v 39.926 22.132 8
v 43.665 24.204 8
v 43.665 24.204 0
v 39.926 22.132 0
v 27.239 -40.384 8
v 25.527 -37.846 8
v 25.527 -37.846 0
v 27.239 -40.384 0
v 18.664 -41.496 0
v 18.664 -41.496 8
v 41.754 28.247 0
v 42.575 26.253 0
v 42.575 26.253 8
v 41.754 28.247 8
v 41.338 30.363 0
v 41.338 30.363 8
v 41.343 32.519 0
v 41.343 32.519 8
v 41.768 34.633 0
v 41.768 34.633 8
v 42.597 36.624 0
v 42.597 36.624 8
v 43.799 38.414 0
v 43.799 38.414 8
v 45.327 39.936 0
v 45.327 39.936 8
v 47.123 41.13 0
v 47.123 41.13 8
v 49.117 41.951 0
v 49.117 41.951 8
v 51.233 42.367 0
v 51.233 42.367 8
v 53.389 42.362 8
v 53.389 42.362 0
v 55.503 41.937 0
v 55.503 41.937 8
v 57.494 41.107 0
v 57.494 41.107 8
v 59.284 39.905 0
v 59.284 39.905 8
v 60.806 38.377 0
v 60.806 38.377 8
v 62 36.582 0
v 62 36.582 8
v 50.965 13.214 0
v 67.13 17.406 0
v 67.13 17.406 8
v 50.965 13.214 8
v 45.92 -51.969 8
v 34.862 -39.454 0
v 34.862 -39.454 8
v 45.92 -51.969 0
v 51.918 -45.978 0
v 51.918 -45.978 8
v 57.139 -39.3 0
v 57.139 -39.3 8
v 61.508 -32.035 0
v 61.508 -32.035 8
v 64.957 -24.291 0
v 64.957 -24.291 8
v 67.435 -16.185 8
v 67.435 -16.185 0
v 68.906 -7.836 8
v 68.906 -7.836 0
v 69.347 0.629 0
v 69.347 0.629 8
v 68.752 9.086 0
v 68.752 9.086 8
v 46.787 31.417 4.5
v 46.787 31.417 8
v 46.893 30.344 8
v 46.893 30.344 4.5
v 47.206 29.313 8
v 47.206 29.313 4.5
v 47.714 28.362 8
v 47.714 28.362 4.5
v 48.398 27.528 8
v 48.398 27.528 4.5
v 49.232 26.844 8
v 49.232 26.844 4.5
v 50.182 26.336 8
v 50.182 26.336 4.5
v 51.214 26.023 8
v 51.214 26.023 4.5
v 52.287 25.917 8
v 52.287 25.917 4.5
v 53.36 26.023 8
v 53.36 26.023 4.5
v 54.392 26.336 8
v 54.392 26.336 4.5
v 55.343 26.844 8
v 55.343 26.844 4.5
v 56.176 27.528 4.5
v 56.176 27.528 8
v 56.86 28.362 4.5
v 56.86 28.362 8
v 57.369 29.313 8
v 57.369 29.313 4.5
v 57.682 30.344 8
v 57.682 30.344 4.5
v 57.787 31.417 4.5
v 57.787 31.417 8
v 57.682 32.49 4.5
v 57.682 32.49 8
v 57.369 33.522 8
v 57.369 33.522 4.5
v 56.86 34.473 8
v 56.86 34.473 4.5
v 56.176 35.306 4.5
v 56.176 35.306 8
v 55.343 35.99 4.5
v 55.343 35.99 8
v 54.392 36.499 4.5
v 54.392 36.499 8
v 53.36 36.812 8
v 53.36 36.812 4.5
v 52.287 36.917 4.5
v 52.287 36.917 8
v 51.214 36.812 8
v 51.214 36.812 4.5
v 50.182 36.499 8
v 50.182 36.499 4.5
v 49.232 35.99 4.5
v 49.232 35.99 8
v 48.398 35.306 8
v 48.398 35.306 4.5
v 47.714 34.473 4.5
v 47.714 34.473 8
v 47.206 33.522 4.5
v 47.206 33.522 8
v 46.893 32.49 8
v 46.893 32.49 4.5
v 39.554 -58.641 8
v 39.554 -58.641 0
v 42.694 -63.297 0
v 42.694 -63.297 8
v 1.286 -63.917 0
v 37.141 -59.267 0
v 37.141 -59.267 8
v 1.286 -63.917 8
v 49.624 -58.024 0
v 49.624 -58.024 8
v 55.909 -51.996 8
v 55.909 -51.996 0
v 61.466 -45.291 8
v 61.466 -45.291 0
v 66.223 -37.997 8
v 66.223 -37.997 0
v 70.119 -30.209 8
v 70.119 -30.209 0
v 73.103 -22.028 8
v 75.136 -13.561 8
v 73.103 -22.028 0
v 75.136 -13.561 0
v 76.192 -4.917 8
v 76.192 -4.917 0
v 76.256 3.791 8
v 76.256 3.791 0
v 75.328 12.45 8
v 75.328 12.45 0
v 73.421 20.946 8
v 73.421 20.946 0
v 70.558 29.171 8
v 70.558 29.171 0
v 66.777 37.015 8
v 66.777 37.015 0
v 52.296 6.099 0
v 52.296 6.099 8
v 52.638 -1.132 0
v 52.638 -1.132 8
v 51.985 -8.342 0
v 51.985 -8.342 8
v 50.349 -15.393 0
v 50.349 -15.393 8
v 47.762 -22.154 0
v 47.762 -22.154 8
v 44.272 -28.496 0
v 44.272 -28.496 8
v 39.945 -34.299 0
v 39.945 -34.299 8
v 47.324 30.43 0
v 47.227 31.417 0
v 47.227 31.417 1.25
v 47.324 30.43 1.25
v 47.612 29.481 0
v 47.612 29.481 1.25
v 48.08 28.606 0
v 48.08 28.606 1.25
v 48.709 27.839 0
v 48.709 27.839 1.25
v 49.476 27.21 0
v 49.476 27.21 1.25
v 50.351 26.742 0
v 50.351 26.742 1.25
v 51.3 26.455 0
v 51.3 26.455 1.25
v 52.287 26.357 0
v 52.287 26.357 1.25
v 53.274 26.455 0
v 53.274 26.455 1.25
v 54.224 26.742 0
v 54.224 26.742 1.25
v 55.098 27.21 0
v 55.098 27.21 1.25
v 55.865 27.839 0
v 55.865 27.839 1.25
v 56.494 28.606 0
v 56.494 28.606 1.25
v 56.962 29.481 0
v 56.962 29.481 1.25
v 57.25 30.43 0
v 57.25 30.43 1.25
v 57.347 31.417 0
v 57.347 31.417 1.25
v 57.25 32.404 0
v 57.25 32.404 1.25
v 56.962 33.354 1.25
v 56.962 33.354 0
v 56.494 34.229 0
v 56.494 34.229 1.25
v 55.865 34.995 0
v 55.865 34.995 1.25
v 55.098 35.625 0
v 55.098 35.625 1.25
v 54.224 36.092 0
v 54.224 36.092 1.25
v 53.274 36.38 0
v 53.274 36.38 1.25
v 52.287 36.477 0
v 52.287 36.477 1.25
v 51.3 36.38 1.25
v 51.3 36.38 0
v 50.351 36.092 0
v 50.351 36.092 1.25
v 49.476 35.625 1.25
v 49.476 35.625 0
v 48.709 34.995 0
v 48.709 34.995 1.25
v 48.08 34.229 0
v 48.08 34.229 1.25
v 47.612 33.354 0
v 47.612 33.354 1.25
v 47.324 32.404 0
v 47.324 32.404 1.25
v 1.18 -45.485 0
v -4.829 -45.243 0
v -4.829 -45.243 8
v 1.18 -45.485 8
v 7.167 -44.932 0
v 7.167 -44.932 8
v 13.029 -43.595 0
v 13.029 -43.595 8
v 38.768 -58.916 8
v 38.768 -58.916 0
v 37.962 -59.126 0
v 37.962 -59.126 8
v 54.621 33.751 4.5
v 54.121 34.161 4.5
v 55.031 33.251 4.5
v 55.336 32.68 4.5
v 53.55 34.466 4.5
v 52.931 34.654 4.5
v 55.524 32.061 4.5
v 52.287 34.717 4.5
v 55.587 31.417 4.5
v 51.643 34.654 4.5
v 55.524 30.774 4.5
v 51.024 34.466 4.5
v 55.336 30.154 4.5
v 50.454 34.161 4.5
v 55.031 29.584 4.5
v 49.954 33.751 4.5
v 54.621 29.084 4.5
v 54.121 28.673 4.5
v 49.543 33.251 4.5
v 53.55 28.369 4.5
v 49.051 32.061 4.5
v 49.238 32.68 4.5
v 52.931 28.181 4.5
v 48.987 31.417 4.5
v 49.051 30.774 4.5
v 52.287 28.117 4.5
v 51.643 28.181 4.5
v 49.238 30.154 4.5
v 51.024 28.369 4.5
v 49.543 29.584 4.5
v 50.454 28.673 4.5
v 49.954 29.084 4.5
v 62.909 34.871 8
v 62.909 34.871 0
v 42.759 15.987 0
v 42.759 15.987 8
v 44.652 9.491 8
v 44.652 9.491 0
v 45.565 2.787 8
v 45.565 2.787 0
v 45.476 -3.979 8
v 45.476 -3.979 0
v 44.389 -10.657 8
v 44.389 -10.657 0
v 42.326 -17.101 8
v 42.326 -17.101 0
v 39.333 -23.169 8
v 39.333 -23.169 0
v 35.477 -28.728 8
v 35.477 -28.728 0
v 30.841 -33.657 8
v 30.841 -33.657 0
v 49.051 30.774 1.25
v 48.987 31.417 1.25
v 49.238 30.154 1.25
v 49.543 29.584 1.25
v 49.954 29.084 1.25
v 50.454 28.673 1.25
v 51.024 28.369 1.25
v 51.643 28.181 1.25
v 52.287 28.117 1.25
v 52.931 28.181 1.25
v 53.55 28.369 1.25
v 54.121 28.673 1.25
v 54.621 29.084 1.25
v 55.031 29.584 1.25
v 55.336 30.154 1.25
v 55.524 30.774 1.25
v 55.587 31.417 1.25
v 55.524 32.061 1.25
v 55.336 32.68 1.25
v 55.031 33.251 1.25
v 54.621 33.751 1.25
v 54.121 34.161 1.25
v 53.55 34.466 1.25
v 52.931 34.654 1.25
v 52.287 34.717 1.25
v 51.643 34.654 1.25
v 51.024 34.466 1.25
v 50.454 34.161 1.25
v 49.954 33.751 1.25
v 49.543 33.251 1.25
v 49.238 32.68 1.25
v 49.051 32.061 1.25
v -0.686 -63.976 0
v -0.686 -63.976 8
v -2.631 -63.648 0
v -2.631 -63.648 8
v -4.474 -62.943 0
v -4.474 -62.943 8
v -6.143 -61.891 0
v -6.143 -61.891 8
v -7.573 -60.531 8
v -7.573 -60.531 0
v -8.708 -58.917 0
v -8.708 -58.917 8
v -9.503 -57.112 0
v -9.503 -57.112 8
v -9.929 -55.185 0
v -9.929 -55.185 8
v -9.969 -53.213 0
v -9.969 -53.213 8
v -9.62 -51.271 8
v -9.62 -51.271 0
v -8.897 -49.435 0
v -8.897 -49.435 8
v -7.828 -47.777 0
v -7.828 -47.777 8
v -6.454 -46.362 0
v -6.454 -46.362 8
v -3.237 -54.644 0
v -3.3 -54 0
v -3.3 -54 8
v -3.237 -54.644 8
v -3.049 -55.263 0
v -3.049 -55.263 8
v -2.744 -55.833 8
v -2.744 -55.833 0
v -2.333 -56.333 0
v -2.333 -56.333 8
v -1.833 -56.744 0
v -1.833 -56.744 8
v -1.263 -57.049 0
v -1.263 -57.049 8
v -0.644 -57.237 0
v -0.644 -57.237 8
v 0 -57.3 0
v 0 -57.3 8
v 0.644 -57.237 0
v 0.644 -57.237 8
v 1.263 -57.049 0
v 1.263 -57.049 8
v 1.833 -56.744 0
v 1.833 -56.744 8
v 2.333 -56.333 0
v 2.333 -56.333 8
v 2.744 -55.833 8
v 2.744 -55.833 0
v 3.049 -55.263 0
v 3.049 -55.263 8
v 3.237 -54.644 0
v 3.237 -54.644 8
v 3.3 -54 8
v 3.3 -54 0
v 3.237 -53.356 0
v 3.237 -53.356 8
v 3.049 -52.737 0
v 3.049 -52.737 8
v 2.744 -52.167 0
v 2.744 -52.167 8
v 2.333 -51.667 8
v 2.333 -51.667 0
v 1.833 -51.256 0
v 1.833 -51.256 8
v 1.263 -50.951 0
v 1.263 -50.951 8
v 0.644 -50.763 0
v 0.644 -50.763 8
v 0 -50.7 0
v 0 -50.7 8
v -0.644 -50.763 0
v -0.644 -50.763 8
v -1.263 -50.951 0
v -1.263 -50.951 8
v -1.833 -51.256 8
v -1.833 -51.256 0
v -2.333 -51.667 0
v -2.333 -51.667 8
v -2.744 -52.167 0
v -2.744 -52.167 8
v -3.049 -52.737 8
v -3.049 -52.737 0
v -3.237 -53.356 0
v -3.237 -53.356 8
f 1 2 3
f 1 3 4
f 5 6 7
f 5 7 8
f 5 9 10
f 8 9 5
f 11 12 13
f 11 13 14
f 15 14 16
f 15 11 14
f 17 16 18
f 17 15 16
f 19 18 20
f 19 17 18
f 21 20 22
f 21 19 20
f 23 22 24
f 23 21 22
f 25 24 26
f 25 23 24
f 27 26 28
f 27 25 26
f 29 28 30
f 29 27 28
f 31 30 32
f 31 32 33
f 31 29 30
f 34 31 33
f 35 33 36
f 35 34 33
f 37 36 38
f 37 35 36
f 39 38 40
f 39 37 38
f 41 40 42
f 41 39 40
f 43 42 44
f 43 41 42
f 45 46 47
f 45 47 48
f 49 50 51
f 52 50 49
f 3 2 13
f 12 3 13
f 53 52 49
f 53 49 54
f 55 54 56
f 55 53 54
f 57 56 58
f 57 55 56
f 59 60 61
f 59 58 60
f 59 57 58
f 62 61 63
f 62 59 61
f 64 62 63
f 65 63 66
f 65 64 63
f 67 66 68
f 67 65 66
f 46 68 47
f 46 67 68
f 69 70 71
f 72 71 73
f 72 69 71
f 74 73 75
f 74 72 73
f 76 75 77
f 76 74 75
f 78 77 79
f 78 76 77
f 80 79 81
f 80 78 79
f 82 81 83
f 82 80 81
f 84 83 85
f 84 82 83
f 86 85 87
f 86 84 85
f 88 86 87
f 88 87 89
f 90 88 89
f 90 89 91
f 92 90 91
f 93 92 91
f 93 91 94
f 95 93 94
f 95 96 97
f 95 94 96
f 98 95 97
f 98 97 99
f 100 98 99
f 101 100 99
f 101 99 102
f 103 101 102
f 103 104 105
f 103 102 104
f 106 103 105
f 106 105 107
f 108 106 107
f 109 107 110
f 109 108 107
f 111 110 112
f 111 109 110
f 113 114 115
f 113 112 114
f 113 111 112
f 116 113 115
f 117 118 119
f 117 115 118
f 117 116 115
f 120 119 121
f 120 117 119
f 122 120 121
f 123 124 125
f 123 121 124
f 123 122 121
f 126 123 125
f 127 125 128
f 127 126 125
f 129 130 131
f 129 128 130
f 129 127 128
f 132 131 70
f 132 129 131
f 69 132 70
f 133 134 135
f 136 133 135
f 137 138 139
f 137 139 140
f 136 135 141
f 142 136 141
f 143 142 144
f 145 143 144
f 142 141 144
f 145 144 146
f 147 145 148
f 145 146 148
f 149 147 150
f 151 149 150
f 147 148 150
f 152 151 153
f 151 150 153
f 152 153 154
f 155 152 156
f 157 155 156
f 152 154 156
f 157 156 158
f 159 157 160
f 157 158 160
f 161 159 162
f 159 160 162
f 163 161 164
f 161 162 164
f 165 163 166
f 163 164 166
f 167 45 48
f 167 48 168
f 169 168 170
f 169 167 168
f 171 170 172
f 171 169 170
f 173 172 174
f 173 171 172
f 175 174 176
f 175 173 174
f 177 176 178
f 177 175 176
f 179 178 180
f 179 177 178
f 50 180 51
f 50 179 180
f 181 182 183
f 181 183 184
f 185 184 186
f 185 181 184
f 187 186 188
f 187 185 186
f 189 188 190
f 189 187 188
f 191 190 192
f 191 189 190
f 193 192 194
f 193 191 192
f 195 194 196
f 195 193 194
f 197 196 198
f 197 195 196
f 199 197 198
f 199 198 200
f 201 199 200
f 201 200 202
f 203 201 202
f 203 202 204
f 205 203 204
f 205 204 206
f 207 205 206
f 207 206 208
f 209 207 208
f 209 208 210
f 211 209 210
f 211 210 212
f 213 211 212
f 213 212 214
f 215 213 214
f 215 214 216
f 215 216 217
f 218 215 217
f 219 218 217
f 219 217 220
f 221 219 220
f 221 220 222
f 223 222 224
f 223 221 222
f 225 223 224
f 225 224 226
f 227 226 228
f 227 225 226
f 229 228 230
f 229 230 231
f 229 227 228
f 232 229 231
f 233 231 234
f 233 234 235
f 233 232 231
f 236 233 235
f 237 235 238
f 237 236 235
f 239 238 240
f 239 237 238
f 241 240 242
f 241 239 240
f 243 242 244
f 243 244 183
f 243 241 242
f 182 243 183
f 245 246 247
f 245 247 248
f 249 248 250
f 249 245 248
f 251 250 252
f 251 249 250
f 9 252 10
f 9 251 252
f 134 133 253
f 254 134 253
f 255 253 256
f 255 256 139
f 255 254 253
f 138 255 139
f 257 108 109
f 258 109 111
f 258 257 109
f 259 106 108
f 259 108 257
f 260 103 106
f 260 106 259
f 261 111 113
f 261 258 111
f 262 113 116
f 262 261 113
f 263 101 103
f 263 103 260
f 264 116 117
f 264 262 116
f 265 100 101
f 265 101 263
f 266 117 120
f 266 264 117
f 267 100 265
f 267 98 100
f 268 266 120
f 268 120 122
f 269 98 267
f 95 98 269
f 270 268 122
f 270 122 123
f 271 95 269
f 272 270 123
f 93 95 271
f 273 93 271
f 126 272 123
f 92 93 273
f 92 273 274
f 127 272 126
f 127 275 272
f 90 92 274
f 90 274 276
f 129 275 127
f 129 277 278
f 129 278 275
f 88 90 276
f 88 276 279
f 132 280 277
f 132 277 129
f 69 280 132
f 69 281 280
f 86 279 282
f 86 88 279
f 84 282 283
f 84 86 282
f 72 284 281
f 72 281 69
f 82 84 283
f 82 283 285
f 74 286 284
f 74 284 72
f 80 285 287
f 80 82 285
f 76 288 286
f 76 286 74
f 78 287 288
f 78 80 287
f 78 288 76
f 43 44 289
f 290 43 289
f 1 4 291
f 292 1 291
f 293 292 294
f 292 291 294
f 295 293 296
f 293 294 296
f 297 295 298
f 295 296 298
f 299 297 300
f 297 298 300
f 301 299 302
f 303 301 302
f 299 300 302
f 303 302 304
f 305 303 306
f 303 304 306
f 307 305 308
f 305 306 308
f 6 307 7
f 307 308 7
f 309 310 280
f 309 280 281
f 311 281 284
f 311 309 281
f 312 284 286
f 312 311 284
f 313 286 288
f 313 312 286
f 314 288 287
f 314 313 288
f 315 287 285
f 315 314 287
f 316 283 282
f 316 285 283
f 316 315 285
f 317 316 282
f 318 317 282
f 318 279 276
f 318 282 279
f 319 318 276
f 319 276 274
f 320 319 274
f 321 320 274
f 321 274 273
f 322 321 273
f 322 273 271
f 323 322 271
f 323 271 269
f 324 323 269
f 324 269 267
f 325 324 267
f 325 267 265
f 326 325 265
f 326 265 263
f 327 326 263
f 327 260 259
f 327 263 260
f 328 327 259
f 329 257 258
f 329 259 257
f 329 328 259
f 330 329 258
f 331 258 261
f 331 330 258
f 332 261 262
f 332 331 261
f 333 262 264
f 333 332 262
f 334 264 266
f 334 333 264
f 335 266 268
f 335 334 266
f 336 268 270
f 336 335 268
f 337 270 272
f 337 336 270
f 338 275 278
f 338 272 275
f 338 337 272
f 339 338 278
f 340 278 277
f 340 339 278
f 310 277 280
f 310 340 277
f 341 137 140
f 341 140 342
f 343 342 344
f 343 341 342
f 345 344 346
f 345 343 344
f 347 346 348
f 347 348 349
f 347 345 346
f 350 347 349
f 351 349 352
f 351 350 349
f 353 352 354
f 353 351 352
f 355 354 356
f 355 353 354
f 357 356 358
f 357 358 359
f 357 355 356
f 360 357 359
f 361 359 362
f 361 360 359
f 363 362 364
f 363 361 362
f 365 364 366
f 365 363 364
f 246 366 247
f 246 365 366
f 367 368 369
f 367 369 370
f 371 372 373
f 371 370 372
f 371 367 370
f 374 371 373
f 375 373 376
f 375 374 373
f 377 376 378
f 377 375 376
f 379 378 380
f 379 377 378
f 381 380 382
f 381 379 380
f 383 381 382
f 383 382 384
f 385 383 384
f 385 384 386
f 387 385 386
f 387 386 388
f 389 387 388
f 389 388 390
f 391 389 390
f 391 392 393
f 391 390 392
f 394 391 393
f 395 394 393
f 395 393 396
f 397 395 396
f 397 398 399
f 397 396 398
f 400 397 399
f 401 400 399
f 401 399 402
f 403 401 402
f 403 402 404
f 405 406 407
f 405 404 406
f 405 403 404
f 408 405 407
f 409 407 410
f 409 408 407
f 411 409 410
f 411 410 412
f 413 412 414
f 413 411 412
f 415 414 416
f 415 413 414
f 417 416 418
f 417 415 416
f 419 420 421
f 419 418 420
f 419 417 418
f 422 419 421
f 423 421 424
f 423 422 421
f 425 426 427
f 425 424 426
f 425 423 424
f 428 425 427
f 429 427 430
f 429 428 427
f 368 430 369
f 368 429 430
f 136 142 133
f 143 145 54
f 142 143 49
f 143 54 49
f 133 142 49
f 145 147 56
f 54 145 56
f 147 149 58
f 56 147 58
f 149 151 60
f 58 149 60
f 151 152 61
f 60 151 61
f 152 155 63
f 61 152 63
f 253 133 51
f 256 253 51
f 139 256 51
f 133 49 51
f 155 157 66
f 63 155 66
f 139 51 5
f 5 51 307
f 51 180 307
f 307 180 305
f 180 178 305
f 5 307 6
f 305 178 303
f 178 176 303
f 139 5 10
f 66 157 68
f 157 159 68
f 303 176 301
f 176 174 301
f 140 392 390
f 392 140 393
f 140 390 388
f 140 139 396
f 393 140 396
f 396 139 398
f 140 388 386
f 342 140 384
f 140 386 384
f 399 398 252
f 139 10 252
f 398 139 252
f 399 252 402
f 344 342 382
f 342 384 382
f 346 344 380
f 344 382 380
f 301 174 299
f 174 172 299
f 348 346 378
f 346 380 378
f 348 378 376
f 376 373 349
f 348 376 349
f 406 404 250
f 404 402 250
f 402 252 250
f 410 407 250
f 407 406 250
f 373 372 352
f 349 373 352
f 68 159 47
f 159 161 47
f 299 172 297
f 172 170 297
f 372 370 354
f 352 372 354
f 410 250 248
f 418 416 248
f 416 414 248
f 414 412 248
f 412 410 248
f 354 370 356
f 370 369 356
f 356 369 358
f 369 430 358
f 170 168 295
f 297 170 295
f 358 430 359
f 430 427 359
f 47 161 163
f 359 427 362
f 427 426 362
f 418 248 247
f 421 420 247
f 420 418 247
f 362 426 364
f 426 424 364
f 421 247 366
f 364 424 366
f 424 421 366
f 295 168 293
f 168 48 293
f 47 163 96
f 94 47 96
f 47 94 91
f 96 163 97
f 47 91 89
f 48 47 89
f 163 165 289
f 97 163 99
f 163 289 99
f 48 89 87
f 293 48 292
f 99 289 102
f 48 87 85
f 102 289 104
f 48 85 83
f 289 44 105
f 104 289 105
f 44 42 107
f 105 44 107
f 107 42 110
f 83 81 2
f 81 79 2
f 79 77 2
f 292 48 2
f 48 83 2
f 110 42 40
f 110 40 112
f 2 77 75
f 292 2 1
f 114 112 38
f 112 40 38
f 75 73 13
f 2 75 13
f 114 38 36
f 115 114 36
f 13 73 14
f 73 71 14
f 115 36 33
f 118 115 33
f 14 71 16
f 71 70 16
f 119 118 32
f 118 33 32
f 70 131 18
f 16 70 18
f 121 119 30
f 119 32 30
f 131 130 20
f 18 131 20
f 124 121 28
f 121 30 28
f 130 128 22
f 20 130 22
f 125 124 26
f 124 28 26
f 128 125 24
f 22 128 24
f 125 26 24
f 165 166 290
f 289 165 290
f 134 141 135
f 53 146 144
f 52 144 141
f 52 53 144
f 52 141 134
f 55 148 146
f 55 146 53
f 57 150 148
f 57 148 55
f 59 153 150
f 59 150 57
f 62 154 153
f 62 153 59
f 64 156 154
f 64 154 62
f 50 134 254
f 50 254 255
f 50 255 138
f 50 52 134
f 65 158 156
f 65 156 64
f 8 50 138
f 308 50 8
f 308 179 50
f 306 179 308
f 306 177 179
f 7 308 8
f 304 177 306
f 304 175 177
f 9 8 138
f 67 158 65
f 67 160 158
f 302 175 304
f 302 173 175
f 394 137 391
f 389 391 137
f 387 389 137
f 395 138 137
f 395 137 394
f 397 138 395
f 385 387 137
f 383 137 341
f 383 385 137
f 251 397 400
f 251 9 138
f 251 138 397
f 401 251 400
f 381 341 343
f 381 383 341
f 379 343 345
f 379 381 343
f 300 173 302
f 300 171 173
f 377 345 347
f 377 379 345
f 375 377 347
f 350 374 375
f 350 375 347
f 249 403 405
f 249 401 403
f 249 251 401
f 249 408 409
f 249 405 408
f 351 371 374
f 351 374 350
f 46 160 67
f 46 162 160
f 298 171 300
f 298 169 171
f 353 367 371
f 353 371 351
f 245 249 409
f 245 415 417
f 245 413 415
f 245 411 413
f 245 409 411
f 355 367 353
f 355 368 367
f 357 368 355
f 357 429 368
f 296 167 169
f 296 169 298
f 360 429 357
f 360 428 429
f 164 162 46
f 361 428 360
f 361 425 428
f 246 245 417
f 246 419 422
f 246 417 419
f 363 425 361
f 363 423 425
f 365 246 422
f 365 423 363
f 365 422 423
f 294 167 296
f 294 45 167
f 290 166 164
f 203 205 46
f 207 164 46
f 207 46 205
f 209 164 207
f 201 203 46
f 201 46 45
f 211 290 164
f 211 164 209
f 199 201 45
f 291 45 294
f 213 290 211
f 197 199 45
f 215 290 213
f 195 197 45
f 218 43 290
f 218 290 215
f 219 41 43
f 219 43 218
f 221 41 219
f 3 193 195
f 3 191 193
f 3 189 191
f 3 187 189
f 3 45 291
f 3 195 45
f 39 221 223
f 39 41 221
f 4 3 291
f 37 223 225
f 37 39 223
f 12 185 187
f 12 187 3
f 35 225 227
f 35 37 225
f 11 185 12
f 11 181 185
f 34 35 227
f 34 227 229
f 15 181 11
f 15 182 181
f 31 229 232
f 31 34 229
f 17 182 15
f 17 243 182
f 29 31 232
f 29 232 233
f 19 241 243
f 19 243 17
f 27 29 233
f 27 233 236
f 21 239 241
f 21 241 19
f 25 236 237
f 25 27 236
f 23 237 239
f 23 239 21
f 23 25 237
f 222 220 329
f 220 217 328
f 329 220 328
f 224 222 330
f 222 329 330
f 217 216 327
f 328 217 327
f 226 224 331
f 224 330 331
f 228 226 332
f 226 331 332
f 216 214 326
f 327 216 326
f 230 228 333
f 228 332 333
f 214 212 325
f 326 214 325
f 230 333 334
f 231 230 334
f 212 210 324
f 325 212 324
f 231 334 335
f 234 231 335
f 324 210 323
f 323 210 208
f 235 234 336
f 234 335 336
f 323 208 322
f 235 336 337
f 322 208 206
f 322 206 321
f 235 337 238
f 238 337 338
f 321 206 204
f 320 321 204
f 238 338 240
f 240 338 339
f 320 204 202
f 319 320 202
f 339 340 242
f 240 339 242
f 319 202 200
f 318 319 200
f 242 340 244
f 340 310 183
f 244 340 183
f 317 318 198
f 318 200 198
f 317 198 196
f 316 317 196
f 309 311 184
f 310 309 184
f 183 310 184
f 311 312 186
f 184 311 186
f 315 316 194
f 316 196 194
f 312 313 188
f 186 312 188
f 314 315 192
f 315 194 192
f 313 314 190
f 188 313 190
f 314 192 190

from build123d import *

# Parameters (mm, degrees)
F_01_EIGHT_MILLIMETRE_TRACK_BLANK_DEPTH        = 8
F_02_LOWER_CAGE_TIE_LANDING_DEPTH              = 8
F_03_BUMP_END_SUPPORT_LANDING_DEPTH            = 8
F_04_START                                     = -0.1
S04_RELIEF_FOR_THE_SWEPT_FLOATING_GUID_R       = 45.5
F_04_RELIEF_FOR_THE_SWEPT_FLOATING_GUIDE_DEPTH = 8.2
F_05_START                                     = -0.1
F_05_CONCENTRIC_GUIDE_AND_TANGENT_STOP_F_DEPTH = 8.2
F_06_START                                     = -0.1
S06_SUPPORT_FASTENERS_R                        = 3.3
F_06_SUPPORT_FASTENERS_DEPTH                   = 8.2
F_07_START                                     = -0.1
S07_BUMP_END_SUPPORT_REGISTER_UNDERSID_R       = 5.06
F_07_BUMP_END_SUPPORT_REGISTER_UNDERSIDE_DEPTH = 1.35
F_08_START                                     = 4.5
S08_FLUSH_BUTTON_SCREW_COUNTERBORE_OUT_R       = 5.5
F_08_FLUSH_BUTTON_SCREW_COUNTERBORE_OUTB_DEPTH = 3.6


with BuildPart() as part:
    # S01 - Eight millimetre track blank → 01 - Eight millimetre track blank (new body)
    with BuildSketch(Plane.XY):
        with BuildLine():
            Line((25.527156043, -37.845565187), (42.69437818, -63.297018665))
            ThreePointArc((42.69437818, -63.297018665), (74.240443422, -17.82355353), (66.77721464, 37.015214506))
            Line((66.77721464, 37.015214506), (39.926389631, 22.131559164))
            ThreePointArc((39.926389631, 22.131559164), (44.388686866, -10.65678086), (25.527156043, -37.845565187))
        make_face()
    extrude(amount=F_01_EIGHT_MILLIMETRE_TRACK_BLANK_DEPTH)

    # S02 - Lower cage tie landing → 02 - Lower cage tie landing (add)
    with BuildSketch(Plane.XY):
        with BuildLine():
            Line((-1.286113116, -44.083049206), (34.568787274, -39.433085863))
            ThreePointArc((34.568787274, -39.433085863), (45.771851184, -48.063923541), (37.141013506, -59.266987451))
            Line((37.141013506, -59.266987451), (1.286113116, -63.916950794))
            ThreePointArc((1.286113116, -63.916950794), (-9.916950794, -55.286113116), (-1.286113116, -44.083049206))
        make_face()
    extrude(amount=F_02_LOWER_CAGE_TIE_LANDING_DEPTH)

    # S03 - Bump end support landing → 03 - Bump end support landing (add)
    with BuildSketch(Plane.XY):
        with BuildLine():
            Line((45.572351488, 20.615526776), (42.574781821, 26.253135379))
            ThreePointArc((42.574781821, 26.253135379), (47.123018152, 41.129746091), (61.999628864, 36.58150976))
            Line((61.999628864, 36.58150976), (64.997198531, 30.943901157))
            ThreePointArc((64.997198531, 30.943901157), (60.4489622, 16.067290445), (45.572351488, 20.615526776))
        make_face()
    extrude(amount=F_03_BUMP_END_SUPPORT_LANDING_DEPTH)

    # S04 - Relief for the swept floating guide barrels → 04 - Relief for the swept floating guide barrels (cut)
    with BuildSketch(Plane.XY.offset(F_04_START)):
        Circle(S04_RELIEF_FOR_THE_SWEPT_FLOATING_GUID_R)
    extrude(amount=F_04_RELIEF_FOR_THE_SWEPT_FLOATING_GUIDE_DEPTH, mode=Mode.SUBTRACT)

    # S05 - Concentric guide and tangent stop faces → 05 - Concentric guide and tangent stop faces (cut)
    with BuildSketch(Plane.XY.offset(F_05_START)):
        with BuildLine():
            Line((34.862224899, -39.454375867), (45.92013859, -51.968869257))
            ThreePointArc((45.92013859, -51.968869257), (66.319734826, -20.275977723), (67.130143118, 17.405929591))
            Line((67.130143118, 17.405929591), (50.9647013, 13.214451233))
            ThreePointArc((50.9647013, 13.214451233), (50.349445401, -15.393370254), (34.862224899, -39.454375867))
        make_face()
    extrude(amount=F_05_CONCENTRIC_GUIDE_AND_TANGENT_STOP_F_DEPTH, mode=Mode.SUBTRACT)

    # S06 - Support fasteners → 06 - Support fasteners (cut)
    with BuildSketch(Plane.XY.offset(F_06_START)):
        with Locations(Location((0, -54, 0), (0, 0, 180))):
            Circle(S06_SUPPORT_FASTENERS_R)
        with Locations(Location((52.287205343, 31.41732257, 0), (0, 0, 180))):
            Circle(S06_SUPPORT_FASTENERS_R)
    extrude(amount=F_06_SUPPORT_FASTENERS_DEPTH, mode=Mode.SUBTRACT)

    # S07 - Bump end support register underside → 07 - Bump end support register underside (cut)
    with BuildSketch(Plane.XY.offset(F_07_START)):
        with Locations(Location((52.287205343, 31.41732257, 0), (0, 0, 180))):
            Circle(S07_BUMP_END_SUPPORT_REGISTER_UNDERSID_R)
    extrude(amount=F_07_BUMP_END_SUPPORT_REGISTER_UNDERSIDE_DEPTH, mode=Mode.SUBTRACT)

    # S08 - Flush button screw counterbore outboard → 08 - Flush button screw counterbore outboard (cut)
    with BuildSketch(Plane.XY.offset(F_08_START)):
        with Locations(Location((52.287205343, 31.41732257, 0), (0, 0, 180))):
            Circle(S08_FLUSH_BUTTON_SCREW_COUNTERBORE_OUT_R)
    extrude(amount=F_08_FLUSH_BUTTON_SCREW_COUNTERBORE_OUTB_DEPTH, mode=Mode.SUBTRACT)


solid = part.part
